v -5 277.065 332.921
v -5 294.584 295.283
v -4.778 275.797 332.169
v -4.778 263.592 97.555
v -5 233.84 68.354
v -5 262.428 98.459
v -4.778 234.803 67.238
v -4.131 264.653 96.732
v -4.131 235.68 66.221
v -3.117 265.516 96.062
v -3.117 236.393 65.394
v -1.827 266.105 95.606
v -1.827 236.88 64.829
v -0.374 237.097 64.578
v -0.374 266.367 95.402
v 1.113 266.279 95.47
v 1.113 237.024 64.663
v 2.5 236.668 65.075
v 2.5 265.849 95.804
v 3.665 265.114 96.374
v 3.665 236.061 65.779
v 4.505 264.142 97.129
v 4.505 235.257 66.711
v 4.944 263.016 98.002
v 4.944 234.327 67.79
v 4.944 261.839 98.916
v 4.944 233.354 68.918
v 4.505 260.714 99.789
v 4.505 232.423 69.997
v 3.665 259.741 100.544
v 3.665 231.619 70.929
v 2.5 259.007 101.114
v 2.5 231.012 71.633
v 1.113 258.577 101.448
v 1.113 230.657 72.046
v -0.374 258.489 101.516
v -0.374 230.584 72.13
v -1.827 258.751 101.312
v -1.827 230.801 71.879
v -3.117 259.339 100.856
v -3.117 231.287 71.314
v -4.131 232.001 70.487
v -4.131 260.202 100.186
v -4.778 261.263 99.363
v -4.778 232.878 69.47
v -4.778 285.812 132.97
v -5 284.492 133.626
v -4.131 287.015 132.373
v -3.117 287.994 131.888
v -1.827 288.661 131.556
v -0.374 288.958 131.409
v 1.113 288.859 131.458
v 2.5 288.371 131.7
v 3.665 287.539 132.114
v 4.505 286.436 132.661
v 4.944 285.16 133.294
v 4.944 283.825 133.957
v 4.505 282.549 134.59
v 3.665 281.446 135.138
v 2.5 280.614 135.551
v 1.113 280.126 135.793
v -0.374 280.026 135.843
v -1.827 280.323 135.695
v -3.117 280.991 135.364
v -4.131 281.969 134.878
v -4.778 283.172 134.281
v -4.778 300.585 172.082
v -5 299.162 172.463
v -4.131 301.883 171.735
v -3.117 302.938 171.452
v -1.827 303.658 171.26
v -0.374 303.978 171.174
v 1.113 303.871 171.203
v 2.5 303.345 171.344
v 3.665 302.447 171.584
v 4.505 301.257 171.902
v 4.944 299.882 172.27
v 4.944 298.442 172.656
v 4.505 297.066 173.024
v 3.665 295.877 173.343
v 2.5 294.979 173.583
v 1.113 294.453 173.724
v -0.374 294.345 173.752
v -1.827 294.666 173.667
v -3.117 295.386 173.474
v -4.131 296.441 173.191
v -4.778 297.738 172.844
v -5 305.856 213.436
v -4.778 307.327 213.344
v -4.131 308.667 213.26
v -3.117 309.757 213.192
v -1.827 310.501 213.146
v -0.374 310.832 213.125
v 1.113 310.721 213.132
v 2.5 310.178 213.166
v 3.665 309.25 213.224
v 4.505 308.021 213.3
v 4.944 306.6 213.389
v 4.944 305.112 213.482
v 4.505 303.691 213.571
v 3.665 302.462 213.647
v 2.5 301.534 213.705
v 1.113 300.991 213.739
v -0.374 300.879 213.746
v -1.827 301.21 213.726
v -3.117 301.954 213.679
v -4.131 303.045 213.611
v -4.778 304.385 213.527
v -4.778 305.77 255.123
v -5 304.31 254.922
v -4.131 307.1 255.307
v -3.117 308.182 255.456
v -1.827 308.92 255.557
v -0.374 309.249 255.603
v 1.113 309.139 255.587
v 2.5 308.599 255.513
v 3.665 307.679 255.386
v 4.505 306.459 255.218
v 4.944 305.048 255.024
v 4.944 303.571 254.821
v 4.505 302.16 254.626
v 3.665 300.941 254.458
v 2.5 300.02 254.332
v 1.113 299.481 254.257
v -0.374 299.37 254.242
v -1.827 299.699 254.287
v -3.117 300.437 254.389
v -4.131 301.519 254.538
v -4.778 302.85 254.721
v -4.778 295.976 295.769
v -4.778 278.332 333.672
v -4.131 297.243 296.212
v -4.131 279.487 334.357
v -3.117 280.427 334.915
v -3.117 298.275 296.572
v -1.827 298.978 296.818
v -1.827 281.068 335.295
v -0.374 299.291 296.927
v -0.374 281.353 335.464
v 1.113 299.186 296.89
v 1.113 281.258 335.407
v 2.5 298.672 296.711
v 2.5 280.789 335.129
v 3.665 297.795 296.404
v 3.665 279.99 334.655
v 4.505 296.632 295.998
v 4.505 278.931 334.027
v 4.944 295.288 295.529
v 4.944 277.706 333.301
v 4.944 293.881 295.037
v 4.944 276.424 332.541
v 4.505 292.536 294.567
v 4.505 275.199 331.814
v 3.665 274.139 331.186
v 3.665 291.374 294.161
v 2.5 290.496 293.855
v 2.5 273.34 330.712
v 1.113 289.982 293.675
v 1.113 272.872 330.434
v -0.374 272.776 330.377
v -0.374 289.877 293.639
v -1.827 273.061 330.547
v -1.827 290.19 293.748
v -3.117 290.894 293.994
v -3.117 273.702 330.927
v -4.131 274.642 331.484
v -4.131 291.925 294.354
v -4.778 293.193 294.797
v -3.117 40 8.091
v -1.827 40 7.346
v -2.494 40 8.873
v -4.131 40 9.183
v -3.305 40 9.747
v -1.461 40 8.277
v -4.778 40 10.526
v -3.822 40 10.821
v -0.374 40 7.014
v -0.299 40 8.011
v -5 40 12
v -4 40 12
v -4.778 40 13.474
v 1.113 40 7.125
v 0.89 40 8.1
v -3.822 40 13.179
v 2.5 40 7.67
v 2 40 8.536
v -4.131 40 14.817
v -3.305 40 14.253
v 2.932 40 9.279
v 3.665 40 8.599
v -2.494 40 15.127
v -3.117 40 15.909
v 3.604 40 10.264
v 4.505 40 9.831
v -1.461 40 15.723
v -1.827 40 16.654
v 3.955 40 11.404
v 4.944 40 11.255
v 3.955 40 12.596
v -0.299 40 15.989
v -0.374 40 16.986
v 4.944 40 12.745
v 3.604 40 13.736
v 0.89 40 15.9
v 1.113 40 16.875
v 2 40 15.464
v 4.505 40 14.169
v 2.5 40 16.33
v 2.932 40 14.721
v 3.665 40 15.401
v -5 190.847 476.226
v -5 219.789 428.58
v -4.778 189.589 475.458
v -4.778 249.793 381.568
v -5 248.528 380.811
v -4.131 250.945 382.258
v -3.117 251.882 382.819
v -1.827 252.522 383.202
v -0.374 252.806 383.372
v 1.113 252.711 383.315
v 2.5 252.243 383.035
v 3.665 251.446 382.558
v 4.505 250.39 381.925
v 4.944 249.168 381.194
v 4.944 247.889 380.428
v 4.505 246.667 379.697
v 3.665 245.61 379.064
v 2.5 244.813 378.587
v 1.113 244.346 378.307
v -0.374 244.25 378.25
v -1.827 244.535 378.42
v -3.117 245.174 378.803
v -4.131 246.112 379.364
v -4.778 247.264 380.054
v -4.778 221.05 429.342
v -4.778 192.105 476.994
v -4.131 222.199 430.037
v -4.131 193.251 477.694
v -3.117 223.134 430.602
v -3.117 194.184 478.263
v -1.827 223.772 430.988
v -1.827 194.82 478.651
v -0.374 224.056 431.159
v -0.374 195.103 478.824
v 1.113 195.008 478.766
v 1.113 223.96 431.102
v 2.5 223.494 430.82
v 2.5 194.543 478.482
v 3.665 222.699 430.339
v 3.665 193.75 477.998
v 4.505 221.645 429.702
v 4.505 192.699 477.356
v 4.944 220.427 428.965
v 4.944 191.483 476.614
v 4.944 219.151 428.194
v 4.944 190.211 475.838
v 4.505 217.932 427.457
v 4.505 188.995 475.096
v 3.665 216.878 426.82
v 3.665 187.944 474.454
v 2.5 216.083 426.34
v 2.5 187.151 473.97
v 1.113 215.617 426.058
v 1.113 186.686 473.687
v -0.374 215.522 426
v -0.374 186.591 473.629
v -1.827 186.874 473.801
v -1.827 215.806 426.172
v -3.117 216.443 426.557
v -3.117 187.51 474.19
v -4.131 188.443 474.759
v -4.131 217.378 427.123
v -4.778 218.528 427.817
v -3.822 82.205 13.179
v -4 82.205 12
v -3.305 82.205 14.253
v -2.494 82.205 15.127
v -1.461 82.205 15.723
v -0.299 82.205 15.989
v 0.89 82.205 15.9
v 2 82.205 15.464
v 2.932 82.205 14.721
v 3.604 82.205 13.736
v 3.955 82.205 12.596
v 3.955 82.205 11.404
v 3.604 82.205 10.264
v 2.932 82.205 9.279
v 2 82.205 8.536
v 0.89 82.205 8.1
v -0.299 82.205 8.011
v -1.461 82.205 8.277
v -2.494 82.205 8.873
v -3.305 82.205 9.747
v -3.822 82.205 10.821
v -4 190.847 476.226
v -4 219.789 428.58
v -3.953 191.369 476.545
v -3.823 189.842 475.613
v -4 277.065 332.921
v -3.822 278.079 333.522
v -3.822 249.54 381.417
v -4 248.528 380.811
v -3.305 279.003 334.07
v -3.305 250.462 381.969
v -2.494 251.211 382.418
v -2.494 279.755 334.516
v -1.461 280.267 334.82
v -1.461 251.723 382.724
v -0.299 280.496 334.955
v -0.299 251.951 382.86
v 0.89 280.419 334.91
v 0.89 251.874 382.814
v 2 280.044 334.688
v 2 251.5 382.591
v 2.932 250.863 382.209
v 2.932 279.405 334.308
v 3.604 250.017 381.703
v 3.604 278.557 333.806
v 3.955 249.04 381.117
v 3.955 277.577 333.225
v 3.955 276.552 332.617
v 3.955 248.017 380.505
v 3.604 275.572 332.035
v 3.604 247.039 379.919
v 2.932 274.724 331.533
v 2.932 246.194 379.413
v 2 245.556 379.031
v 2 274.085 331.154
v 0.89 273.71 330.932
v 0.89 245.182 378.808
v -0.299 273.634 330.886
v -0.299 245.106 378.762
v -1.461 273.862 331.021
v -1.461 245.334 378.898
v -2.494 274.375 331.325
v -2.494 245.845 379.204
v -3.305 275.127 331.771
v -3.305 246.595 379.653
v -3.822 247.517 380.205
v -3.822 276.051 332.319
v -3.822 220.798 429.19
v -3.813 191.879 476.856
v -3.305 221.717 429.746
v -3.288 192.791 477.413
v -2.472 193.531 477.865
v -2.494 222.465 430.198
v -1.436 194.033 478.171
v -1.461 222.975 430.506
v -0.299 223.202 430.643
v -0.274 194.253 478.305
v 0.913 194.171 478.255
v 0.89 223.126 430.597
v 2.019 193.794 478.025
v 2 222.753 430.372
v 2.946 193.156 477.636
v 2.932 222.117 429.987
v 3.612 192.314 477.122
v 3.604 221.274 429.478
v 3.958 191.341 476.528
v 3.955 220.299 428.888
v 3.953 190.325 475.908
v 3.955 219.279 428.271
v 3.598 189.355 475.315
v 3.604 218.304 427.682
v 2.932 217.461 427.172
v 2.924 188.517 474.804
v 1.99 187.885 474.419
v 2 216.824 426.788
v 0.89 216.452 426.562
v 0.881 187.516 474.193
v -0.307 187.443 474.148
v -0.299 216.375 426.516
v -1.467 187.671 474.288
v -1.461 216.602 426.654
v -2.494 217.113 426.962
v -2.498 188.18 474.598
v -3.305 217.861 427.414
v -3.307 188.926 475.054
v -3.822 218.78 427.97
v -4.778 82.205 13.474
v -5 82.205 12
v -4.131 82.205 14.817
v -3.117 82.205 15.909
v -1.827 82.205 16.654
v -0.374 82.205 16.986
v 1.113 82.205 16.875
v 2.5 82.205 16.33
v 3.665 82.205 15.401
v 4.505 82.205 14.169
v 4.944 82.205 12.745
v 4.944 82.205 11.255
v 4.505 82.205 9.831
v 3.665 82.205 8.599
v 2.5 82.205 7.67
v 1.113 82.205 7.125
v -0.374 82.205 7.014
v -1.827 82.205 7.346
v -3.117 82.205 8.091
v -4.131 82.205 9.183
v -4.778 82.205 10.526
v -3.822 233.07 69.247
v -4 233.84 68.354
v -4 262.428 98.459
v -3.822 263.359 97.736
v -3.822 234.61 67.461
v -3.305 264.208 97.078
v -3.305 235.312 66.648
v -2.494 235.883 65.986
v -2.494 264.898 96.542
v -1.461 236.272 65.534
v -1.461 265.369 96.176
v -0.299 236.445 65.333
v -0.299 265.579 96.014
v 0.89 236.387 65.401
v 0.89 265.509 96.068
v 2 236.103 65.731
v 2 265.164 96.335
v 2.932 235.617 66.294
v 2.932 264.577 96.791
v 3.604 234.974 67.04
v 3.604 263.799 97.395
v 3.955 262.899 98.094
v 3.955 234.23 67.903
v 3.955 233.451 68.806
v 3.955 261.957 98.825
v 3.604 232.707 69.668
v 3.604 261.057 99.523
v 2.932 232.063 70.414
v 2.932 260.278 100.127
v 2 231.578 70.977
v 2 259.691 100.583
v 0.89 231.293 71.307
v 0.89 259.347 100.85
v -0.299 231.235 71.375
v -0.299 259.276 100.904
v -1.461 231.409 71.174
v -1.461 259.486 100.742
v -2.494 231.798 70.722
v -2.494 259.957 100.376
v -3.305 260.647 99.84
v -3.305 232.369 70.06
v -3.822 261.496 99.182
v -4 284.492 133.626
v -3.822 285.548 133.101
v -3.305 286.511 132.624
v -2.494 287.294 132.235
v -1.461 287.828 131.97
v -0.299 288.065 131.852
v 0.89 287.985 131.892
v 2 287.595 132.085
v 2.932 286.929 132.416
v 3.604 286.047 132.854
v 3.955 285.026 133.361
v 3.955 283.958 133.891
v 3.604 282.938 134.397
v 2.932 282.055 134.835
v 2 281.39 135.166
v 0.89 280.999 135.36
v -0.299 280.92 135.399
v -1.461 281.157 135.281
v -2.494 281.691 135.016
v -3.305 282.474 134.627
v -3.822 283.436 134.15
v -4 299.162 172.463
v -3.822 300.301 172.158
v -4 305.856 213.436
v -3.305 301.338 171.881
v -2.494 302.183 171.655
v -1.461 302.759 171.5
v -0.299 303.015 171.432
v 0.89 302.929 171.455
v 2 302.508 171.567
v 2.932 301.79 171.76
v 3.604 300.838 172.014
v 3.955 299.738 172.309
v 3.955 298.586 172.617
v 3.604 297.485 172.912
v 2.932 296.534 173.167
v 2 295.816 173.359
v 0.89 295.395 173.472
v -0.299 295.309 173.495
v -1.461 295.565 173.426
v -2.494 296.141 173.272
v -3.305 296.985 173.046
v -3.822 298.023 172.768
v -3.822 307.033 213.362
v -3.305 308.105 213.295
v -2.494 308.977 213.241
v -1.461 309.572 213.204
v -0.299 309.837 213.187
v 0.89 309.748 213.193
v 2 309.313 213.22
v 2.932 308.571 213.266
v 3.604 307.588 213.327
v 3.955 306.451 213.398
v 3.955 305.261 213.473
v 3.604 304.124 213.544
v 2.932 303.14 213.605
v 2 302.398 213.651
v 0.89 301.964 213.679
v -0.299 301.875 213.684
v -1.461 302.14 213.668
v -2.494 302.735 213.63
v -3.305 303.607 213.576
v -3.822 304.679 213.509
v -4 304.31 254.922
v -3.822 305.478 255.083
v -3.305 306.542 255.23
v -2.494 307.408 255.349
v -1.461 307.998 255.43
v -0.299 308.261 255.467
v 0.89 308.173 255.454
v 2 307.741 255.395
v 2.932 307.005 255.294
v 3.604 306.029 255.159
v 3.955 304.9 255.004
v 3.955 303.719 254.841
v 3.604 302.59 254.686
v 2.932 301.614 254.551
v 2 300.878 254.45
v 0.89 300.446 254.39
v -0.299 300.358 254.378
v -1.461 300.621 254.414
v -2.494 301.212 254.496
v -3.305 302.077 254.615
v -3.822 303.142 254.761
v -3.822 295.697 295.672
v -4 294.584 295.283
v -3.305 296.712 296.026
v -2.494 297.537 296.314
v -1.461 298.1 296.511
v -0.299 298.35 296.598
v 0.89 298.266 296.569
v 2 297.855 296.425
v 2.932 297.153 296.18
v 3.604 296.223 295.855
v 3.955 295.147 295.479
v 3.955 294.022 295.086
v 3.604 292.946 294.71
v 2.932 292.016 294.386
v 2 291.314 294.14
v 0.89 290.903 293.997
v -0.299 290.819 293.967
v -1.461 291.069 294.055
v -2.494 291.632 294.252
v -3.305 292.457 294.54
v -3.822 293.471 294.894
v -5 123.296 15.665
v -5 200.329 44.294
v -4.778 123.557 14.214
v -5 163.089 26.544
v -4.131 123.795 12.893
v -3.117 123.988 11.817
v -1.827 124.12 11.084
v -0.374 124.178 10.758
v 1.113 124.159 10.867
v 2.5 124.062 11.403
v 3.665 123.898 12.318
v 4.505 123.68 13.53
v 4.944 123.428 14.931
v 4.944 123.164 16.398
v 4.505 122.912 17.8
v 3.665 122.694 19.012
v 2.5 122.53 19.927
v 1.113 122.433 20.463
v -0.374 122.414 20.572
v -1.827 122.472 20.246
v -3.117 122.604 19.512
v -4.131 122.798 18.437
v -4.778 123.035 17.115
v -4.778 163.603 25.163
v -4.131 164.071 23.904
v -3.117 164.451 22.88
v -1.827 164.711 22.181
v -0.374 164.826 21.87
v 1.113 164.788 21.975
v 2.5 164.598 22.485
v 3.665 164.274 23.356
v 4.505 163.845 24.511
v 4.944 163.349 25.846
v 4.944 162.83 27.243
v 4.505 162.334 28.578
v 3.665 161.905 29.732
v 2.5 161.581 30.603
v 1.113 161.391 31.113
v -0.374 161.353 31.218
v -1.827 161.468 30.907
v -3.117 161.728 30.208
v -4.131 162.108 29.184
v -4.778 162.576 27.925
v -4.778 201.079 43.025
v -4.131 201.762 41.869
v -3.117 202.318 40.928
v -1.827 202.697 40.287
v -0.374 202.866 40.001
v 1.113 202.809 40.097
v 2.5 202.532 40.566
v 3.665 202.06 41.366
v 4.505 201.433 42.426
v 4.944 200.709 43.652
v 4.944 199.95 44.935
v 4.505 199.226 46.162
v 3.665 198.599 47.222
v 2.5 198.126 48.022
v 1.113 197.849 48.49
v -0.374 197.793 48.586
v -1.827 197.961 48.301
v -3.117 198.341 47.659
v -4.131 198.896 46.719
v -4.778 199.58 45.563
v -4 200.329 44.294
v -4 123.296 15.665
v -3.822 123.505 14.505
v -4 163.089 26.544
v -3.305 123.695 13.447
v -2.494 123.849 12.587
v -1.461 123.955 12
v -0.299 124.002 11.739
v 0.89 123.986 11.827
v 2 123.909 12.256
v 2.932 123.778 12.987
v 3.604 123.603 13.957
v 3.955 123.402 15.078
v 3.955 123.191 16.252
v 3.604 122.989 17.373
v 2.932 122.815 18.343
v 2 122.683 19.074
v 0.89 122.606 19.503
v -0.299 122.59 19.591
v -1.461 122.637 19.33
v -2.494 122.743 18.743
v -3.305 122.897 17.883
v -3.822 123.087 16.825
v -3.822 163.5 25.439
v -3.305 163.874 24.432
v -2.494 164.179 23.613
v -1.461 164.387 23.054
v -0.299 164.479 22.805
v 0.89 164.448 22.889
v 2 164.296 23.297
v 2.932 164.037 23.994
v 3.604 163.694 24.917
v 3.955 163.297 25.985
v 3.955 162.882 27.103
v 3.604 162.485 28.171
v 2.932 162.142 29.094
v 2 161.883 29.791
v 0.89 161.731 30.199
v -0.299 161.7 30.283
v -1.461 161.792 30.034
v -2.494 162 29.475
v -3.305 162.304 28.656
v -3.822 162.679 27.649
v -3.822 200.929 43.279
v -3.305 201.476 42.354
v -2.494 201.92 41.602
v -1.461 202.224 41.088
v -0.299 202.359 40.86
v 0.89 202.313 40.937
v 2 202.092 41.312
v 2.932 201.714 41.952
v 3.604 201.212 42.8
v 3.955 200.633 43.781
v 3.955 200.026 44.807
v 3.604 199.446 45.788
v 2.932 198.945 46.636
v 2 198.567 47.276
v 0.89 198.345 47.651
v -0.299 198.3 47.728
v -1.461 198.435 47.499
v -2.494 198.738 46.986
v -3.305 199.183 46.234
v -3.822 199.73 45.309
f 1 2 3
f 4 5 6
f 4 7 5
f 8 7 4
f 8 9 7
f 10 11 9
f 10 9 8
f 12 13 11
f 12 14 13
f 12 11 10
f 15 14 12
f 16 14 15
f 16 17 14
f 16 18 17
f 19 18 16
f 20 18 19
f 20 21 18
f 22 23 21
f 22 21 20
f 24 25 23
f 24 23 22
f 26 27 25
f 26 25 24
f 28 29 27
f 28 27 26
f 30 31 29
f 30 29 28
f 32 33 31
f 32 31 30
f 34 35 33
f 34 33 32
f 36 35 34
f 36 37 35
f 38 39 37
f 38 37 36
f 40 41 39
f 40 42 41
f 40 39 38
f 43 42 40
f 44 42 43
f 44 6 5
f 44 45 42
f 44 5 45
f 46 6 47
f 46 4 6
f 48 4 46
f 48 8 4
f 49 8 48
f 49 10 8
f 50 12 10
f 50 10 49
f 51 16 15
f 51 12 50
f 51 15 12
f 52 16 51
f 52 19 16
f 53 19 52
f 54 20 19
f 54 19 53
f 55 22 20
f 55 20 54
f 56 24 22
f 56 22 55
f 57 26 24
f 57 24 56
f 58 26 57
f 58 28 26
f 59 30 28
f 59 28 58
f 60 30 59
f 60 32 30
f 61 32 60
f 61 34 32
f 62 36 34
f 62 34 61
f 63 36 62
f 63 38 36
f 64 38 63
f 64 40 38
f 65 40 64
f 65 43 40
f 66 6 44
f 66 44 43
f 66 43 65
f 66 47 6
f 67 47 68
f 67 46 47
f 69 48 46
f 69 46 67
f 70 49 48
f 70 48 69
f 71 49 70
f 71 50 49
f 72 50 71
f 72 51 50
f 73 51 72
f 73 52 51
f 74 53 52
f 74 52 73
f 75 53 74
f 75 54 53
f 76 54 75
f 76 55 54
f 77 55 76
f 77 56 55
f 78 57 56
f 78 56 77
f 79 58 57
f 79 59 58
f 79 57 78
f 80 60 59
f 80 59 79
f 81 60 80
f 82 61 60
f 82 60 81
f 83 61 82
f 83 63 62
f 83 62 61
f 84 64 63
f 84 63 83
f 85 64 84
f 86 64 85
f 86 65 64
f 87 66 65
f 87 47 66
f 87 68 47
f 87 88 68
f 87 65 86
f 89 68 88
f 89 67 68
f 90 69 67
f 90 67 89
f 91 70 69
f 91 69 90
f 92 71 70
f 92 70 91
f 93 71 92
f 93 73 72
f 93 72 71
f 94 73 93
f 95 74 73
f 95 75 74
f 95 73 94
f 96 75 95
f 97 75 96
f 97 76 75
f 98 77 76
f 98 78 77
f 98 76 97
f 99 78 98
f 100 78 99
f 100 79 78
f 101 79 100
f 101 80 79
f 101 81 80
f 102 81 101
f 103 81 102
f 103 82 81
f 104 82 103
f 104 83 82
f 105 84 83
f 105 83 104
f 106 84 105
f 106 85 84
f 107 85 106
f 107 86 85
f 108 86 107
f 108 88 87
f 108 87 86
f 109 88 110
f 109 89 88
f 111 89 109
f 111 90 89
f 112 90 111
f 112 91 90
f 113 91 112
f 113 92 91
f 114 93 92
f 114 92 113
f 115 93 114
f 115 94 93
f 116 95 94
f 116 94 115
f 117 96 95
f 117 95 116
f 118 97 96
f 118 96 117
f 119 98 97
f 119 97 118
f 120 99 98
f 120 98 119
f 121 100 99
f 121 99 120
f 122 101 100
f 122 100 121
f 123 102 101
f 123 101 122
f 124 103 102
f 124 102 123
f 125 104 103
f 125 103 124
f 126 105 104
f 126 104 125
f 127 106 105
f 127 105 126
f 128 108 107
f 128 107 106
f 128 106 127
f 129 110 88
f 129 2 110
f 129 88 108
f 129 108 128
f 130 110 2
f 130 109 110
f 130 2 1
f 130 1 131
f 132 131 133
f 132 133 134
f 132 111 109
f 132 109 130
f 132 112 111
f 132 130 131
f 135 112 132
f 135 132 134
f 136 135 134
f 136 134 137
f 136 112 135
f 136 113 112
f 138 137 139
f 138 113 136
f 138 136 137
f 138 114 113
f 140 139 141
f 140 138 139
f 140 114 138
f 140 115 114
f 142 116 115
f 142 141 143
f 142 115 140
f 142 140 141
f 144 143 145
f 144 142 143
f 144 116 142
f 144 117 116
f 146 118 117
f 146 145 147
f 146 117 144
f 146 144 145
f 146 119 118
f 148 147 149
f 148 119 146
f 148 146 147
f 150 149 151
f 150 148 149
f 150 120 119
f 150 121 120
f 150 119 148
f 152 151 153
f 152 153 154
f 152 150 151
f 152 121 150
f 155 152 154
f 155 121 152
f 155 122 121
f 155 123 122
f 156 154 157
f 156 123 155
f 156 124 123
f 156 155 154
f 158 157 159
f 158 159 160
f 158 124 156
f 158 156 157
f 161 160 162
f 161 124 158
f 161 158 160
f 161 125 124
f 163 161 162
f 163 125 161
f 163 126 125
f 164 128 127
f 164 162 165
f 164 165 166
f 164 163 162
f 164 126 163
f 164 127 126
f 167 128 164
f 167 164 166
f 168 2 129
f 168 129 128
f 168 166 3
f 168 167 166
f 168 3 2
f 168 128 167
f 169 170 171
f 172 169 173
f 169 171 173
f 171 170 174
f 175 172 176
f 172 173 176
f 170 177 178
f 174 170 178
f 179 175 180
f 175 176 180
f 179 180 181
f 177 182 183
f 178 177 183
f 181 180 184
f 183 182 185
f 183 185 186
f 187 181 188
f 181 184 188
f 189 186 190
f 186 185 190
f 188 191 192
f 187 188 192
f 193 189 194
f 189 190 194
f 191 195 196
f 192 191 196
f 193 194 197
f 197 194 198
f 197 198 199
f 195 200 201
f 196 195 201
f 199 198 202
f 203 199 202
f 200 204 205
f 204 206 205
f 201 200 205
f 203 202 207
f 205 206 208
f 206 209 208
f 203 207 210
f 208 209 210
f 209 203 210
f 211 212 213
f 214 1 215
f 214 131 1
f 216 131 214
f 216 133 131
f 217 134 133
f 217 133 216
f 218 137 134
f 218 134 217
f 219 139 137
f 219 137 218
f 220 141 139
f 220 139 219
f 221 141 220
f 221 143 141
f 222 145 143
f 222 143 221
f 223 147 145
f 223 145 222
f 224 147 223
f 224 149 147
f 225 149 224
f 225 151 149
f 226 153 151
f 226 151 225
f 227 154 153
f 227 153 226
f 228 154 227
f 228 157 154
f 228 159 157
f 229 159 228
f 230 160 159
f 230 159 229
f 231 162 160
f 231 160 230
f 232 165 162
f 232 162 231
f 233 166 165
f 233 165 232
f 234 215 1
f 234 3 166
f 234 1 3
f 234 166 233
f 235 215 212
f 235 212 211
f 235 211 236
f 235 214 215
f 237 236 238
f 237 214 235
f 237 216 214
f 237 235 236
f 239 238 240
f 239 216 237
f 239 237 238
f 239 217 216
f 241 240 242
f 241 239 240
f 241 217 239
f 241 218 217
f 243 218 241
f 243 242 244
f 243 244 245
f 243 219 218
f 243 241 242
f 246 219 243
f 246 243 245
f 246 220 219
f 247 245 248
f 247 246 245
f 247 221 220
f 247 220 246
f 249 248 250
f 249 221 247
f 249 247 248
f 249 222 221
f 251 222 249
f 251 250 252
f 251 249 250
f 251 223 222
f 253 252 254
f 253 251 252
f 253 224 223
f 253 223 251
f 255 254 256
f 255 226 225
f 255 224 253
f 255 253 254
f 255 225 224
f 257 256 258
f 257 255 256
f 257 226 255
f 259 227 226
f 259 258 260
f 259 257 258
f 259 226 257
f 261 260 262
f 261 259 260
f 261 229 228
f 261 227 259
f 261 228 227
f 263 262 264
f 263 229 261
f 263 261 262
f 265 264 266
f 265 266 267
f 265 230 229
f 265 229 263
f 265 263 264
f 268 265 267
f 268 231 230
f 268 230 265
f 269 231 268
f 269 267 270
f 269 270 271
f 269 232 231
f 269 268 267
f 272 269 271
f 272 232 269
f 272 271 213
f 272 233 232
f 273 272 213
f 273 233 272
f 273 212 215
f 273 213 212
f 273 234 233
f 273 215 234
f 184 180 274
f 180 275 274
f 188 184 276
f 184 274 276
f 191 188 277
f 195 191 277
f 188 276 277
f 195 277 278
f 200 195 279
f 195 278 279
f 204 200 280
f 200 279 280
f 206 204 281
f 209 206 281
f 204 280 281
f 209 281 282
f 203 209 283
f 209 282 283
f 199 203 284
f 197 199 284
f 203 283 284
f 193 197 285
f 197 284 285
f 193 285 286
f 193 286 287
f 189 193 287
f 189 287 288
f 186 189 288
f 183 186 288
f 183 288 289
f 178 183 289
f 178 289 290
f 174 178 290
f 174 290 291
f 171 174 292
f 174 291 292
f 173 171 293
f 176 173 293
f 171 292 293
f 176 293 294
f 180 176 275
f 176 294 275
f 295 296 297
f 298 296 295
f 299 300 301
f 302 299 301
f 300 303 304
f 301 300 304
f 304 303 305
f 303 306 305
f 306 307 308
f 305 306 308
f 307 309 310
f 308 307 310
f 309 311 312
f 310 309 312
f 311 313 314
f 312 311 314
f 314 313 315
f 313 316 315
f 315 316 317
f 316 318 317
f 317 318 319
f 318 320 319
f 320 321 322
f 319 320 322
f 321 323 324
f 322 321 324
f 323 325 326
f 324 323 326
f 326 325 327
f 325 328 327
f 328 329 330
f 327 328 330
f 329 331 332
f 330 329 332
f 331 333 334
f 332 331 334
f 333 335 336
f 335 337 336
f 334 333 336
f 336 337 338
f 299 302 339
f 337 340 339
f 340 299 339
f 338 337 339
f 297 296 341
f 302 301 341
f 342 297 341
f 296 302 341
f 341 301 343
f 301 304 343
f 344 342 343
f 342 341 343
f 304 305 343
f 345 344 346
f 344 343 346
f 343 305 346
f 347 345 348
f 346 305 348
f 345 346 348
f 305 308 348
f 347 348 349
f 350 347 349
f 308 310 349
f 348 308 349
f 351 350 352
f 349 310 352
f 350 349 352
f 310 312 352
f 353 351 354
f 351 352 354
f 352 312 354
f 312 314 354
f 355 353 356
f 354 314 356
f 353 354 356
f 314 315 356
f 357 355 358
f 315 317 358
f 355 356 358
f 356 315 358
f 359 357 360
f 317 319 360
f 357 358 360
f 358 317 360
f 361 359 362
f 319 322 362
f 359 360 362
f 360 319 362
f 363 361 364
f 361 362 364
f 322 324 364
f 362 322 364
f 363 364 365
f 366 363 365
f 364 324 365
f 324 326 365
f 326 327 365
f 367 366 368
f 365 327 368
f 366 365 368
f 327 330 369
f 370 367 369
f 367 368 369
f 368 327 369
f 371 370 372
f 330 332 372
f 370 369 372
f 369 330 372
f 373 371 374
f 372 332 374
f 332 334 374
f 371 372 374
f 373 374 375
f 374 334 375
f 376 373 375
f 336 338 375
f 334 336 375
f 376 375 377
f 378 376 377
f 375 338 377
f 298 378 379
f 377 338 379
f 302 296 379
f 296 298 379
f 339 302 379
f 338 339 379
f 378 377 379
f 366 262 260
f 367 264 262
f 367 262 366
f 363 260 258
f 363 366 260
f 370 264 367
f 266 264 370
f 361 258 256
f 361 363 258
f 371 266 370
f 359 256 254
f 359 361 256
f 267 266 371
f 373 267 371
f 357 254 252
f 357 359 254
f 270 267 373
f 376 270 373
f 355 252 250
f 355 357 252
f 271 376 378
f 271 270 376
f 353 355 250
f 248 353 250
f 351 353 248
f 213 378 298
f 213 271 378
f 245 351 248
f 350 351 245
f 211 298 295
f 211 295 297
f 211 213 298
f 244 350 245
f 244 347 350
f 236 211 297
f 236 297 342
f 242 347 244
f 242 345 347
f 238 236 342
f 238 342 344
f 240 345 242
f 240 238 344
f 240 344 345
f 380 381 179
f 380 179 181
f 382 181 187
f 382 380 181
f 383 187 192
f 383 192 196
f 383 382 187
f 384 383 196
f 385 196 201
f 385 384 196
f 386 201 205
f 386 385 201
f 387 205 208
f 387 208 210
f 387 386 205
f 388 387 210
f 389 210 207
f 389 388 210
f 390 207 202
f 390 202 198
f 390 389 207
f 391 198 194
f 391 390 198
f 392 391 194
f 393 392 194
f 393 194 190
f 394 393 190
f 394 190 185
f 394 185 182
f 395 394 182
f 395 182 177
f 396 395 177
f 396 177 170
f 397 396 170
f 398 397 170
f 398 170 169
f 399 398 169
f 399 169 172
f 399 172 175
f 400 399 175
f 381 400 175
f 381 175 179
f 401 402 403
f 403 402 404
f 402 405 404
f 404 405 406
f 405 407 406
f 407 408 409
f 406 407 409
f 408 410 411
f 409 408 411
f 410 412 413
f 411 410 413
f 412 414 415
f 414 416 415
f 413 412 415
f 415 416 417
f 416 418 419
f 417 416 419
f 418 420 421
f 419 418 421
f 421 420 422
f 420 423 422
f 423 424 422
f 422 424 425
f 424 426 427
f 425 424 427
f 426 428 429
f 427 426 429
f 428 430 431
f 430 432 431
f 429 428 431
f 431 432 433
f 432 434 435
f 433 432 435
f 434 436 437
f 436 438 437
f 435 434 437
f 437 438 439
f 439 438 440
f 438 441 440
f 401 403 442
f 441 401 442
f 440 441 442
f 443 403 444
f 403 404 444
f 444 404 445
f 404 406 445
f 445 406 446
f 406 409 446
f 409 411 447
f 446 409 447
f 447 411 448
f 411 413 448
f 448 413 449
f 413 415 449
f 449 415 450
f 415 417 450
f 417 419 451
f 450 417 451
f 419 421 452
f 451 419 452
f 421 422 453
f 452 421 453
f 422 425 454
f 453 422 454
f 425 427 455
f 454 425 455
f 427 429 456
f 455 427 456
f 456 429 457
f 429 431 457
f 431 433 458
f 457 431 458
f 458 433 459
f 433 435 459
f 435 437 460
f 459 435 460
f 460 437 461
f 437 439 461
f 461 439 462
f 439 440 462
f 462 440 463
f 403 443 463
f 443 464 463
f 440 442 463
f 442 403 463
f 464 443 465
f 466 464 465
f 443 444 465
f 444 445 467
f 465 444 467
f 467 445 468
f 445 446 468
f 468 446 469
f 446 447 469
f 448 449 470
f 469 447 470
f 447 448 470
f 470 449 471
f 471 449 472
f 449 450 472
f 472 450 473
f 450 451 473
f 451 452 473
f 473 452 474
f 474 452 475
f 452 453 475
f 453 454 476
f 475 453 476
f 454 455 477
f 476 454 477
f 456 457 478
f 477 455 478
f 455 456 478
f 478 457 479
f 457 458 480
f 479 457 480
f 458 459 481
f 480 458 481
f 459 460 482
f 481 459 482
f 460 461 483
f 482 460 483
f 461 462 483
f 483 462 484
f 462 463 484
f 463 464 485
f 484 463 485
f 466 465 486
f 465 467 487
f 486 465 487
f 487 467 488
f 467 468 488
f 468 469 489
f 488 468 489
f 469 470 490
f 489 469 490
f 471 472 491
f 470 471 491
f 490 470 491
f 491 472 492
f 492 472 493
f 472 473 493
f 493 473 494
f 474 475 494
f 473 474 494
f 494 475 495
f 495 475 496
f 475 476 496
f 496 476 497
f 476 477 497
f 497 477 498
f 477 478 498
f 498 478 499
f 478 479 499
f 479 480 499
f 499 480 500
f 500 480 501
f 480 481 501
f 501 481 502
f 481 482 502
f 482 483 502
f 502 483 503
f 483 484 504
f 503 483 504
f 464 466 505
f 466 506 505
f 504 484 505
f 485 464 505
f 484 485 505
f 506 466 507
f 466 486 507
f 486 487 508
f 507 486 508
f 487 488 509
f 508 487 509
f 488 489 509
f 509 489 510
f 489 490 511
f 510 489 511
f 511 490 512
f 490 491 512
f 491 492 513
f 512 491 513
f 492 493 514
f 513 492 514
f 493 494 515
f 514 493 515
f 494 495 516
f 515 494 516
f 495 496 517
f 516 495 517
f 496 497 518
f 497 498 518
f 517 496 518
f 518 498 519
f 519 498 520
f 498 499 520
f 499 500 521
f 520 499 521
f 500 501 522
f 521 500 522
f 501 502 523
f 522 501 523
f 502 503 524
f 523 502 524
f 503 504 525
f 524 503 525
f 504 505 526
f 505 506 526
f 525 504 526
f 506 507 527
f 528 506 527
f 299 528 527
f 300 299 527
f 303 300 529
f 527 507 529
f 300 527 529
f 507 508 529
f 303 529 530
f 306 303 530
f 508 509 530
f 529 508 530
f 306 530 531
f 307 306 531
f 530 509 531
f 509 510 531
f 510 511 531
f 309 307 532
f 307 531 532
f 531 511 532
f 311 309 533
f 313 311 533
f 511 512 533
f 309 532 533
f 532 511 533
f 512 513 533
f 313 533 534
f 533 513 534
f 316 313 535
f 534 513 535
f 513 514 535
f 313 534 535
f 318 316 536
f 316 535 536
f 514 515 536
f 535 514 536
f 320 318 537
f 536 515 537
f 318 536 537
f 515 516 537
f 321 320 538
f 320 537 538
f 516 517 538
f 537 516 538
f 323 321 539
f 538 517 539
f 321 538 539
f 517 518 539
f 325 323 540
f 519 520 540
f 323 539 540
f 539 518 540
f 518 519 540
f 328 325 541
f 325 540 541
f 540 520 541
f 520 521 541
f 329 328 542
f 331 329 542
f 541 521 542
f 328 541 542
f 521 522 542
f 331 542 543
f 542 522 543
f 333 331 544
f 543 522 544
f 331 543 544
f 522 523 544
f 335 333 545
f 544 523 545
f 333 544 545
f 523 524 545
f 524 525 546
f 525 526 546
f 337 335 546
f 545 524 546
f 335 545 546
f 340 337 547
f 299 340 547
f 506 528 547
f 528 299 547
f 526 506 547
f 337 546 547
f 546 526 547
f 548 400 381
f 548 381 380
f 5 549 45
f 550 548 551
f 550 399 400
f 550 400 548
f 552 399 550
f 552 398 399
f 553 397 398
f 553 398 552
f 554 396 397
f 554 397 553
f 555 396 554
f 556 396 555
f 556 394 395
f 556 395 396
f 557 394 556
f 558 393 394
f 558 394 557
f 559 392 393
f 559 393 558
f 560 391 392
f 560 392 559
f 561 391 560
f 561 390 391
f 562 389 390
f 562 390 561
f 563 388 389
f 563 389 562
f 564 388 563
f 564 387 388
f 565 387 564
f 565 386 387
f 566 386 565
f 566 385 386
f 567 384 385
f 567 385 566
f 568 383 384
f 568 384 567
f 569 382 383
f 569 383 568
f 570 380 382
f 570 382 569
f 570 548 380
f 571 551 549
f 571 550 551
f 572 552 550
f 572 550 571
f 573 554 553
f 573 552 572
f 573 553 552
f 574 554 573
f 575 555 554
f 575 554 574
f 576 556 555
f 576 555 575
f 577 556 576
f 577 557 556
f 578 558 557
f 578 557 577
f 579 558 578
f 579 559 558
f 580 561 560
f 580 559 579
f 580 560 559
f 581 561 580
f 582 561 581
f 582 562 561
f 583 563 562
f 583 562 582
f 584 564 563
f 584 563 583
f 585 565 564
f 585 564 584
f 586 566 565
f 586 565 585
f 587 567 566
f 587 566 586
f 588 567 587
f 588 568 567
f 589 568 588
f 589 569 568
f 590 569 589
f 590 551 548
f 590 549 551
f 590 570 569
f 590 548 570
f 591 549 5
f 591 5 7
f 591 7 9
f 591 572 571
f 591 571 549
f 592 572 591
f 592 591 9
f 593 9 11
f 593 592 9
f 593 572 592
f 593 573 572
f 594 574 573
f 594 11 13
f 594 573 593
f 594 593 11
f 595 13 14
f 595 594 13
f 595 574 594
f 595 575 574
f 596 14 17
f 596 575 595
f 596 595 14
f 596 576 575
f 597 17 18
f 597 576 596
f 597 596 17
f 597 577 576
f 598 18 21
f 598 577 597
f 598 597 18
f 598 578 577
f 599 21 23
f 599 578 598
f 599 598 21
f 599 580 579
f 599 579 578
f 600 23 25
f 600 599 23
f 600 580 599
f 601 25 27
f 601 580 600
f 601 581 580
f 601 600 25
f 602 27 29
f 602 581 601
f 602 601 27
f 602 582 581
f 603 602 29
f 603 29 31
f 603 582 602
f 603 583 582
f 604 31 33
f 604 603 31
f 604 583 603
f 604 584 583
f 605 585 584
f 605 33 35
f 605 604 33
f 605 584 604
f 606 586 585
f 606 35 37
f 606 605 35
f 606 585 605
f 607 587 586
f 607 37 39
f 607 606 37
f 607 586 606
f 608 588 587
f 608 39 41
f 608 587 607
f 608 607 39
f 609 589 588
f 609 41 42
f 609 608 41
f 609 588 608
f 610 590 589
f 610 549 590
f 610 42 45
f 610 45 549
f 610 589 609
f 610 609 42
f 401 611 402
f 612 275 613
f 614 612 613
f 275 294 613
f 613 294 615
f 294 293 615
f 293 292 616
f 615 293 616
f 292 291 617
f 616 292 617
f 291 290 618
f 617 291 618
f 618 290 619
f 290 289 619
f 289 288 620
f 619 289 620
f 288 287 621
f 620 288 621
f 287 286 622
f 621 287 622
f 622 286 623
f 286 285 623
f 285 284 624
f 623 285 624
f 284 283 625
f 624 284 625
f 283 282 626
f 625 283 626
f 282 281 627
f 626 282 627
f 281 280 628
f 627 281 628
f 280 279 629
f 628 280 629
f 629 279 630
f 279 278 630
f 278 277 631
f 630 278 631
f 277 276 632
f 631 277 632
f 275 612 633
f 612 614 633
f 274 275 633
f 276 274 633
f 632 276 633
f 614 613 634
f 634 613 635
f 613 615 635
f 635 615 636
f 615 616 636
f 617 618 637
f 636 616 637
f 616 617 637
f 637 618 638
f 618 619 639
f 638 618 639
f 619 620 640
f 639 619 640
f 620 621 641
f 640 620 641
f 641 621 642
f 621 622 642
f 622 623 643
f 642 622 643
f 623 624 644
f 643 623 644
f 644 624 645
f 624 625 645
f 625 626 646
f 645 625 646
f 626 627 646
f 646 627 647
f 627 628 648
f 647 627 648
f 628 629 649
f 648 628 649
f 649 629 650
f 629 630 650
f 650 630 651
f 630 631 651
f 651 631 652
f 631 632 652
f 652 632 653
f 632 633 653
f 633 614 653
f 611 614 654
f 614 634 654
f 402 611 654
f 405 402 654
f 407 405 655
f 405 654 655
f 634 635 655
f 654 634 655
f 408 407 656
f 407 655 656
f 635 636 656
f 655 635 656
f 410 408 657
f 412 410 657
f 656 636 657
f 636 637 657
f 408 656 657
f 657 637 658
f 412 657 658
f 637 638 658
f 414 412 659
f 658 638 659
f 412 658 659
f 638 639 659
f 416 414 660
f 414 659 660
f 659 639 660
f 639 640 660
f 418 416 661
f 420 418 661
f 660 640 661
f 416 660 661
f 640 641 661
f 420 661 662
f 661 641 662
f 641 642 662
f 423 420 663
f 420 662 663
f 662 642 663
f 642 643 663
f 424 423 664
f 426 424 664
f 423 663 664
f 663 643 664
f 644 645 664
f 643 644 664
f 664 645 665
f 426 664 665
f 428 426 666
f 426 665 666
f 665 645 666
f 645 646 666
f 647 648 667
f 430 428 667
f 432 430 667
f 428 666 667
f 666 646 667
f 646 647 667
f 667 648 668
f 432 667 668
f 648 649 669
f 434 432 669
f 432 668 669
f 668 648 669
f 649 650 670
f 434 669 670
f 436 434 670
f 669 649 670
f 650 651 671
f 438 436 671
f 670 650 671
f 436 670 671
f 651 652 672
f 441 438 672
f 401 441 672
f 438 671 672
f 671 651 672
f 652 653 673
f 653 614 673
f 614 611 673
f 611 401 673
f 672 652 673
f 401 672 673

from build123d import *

# Parameters (mm, degrees)
CROQUIS7_R = 5
VACIADO2_T = -1


with BuildPart() as part:
    # Barrer1: sweep along a path in Croquis5
    with BuildLine(Plane(origin=(0, 0, 0), x_dir=(0, 0, -1), z_dir=(1, 0, 0))) as barrer1_path:
        Line((-12, 40), (-12, 82.205417262))
        ThreePointArc((-12, 82.205417262), (-26.544036789, 163.089452311), (-68.354058477, 233.840270104))
        ThreePointArc((-68.354058477, 233.840270104), (-192.782537214, 303.529868669), (-332.920608455, 277.064656453))
        ThreePointArc((-332.920608455, 277.064656453), (-404.710677086, 234.183935346), (-476.226198503, 190.846879685))
    # Croquis7 → Barrer1 (sweep)
    with BuildSketch(Plane(origin=(0, 40, 12), x_dir=(-1, 0, 0), z_dir=(0, 1, 0))):
        Circle(CROQUIS7_R)
    sweep(path=barrer1_path.line)

    # Vaciado2
    vaciado2_openings = [part.faces().sort_by_distance(p)[0] for p in [
        (0, 190.846879685, 476.226198503),
        (0, 40, 12),
    ]]
    offset(amount=VACIADO2_T, openings=vaciado2_openings, kind=Kind.INTERSECTION)


solid = part.part
